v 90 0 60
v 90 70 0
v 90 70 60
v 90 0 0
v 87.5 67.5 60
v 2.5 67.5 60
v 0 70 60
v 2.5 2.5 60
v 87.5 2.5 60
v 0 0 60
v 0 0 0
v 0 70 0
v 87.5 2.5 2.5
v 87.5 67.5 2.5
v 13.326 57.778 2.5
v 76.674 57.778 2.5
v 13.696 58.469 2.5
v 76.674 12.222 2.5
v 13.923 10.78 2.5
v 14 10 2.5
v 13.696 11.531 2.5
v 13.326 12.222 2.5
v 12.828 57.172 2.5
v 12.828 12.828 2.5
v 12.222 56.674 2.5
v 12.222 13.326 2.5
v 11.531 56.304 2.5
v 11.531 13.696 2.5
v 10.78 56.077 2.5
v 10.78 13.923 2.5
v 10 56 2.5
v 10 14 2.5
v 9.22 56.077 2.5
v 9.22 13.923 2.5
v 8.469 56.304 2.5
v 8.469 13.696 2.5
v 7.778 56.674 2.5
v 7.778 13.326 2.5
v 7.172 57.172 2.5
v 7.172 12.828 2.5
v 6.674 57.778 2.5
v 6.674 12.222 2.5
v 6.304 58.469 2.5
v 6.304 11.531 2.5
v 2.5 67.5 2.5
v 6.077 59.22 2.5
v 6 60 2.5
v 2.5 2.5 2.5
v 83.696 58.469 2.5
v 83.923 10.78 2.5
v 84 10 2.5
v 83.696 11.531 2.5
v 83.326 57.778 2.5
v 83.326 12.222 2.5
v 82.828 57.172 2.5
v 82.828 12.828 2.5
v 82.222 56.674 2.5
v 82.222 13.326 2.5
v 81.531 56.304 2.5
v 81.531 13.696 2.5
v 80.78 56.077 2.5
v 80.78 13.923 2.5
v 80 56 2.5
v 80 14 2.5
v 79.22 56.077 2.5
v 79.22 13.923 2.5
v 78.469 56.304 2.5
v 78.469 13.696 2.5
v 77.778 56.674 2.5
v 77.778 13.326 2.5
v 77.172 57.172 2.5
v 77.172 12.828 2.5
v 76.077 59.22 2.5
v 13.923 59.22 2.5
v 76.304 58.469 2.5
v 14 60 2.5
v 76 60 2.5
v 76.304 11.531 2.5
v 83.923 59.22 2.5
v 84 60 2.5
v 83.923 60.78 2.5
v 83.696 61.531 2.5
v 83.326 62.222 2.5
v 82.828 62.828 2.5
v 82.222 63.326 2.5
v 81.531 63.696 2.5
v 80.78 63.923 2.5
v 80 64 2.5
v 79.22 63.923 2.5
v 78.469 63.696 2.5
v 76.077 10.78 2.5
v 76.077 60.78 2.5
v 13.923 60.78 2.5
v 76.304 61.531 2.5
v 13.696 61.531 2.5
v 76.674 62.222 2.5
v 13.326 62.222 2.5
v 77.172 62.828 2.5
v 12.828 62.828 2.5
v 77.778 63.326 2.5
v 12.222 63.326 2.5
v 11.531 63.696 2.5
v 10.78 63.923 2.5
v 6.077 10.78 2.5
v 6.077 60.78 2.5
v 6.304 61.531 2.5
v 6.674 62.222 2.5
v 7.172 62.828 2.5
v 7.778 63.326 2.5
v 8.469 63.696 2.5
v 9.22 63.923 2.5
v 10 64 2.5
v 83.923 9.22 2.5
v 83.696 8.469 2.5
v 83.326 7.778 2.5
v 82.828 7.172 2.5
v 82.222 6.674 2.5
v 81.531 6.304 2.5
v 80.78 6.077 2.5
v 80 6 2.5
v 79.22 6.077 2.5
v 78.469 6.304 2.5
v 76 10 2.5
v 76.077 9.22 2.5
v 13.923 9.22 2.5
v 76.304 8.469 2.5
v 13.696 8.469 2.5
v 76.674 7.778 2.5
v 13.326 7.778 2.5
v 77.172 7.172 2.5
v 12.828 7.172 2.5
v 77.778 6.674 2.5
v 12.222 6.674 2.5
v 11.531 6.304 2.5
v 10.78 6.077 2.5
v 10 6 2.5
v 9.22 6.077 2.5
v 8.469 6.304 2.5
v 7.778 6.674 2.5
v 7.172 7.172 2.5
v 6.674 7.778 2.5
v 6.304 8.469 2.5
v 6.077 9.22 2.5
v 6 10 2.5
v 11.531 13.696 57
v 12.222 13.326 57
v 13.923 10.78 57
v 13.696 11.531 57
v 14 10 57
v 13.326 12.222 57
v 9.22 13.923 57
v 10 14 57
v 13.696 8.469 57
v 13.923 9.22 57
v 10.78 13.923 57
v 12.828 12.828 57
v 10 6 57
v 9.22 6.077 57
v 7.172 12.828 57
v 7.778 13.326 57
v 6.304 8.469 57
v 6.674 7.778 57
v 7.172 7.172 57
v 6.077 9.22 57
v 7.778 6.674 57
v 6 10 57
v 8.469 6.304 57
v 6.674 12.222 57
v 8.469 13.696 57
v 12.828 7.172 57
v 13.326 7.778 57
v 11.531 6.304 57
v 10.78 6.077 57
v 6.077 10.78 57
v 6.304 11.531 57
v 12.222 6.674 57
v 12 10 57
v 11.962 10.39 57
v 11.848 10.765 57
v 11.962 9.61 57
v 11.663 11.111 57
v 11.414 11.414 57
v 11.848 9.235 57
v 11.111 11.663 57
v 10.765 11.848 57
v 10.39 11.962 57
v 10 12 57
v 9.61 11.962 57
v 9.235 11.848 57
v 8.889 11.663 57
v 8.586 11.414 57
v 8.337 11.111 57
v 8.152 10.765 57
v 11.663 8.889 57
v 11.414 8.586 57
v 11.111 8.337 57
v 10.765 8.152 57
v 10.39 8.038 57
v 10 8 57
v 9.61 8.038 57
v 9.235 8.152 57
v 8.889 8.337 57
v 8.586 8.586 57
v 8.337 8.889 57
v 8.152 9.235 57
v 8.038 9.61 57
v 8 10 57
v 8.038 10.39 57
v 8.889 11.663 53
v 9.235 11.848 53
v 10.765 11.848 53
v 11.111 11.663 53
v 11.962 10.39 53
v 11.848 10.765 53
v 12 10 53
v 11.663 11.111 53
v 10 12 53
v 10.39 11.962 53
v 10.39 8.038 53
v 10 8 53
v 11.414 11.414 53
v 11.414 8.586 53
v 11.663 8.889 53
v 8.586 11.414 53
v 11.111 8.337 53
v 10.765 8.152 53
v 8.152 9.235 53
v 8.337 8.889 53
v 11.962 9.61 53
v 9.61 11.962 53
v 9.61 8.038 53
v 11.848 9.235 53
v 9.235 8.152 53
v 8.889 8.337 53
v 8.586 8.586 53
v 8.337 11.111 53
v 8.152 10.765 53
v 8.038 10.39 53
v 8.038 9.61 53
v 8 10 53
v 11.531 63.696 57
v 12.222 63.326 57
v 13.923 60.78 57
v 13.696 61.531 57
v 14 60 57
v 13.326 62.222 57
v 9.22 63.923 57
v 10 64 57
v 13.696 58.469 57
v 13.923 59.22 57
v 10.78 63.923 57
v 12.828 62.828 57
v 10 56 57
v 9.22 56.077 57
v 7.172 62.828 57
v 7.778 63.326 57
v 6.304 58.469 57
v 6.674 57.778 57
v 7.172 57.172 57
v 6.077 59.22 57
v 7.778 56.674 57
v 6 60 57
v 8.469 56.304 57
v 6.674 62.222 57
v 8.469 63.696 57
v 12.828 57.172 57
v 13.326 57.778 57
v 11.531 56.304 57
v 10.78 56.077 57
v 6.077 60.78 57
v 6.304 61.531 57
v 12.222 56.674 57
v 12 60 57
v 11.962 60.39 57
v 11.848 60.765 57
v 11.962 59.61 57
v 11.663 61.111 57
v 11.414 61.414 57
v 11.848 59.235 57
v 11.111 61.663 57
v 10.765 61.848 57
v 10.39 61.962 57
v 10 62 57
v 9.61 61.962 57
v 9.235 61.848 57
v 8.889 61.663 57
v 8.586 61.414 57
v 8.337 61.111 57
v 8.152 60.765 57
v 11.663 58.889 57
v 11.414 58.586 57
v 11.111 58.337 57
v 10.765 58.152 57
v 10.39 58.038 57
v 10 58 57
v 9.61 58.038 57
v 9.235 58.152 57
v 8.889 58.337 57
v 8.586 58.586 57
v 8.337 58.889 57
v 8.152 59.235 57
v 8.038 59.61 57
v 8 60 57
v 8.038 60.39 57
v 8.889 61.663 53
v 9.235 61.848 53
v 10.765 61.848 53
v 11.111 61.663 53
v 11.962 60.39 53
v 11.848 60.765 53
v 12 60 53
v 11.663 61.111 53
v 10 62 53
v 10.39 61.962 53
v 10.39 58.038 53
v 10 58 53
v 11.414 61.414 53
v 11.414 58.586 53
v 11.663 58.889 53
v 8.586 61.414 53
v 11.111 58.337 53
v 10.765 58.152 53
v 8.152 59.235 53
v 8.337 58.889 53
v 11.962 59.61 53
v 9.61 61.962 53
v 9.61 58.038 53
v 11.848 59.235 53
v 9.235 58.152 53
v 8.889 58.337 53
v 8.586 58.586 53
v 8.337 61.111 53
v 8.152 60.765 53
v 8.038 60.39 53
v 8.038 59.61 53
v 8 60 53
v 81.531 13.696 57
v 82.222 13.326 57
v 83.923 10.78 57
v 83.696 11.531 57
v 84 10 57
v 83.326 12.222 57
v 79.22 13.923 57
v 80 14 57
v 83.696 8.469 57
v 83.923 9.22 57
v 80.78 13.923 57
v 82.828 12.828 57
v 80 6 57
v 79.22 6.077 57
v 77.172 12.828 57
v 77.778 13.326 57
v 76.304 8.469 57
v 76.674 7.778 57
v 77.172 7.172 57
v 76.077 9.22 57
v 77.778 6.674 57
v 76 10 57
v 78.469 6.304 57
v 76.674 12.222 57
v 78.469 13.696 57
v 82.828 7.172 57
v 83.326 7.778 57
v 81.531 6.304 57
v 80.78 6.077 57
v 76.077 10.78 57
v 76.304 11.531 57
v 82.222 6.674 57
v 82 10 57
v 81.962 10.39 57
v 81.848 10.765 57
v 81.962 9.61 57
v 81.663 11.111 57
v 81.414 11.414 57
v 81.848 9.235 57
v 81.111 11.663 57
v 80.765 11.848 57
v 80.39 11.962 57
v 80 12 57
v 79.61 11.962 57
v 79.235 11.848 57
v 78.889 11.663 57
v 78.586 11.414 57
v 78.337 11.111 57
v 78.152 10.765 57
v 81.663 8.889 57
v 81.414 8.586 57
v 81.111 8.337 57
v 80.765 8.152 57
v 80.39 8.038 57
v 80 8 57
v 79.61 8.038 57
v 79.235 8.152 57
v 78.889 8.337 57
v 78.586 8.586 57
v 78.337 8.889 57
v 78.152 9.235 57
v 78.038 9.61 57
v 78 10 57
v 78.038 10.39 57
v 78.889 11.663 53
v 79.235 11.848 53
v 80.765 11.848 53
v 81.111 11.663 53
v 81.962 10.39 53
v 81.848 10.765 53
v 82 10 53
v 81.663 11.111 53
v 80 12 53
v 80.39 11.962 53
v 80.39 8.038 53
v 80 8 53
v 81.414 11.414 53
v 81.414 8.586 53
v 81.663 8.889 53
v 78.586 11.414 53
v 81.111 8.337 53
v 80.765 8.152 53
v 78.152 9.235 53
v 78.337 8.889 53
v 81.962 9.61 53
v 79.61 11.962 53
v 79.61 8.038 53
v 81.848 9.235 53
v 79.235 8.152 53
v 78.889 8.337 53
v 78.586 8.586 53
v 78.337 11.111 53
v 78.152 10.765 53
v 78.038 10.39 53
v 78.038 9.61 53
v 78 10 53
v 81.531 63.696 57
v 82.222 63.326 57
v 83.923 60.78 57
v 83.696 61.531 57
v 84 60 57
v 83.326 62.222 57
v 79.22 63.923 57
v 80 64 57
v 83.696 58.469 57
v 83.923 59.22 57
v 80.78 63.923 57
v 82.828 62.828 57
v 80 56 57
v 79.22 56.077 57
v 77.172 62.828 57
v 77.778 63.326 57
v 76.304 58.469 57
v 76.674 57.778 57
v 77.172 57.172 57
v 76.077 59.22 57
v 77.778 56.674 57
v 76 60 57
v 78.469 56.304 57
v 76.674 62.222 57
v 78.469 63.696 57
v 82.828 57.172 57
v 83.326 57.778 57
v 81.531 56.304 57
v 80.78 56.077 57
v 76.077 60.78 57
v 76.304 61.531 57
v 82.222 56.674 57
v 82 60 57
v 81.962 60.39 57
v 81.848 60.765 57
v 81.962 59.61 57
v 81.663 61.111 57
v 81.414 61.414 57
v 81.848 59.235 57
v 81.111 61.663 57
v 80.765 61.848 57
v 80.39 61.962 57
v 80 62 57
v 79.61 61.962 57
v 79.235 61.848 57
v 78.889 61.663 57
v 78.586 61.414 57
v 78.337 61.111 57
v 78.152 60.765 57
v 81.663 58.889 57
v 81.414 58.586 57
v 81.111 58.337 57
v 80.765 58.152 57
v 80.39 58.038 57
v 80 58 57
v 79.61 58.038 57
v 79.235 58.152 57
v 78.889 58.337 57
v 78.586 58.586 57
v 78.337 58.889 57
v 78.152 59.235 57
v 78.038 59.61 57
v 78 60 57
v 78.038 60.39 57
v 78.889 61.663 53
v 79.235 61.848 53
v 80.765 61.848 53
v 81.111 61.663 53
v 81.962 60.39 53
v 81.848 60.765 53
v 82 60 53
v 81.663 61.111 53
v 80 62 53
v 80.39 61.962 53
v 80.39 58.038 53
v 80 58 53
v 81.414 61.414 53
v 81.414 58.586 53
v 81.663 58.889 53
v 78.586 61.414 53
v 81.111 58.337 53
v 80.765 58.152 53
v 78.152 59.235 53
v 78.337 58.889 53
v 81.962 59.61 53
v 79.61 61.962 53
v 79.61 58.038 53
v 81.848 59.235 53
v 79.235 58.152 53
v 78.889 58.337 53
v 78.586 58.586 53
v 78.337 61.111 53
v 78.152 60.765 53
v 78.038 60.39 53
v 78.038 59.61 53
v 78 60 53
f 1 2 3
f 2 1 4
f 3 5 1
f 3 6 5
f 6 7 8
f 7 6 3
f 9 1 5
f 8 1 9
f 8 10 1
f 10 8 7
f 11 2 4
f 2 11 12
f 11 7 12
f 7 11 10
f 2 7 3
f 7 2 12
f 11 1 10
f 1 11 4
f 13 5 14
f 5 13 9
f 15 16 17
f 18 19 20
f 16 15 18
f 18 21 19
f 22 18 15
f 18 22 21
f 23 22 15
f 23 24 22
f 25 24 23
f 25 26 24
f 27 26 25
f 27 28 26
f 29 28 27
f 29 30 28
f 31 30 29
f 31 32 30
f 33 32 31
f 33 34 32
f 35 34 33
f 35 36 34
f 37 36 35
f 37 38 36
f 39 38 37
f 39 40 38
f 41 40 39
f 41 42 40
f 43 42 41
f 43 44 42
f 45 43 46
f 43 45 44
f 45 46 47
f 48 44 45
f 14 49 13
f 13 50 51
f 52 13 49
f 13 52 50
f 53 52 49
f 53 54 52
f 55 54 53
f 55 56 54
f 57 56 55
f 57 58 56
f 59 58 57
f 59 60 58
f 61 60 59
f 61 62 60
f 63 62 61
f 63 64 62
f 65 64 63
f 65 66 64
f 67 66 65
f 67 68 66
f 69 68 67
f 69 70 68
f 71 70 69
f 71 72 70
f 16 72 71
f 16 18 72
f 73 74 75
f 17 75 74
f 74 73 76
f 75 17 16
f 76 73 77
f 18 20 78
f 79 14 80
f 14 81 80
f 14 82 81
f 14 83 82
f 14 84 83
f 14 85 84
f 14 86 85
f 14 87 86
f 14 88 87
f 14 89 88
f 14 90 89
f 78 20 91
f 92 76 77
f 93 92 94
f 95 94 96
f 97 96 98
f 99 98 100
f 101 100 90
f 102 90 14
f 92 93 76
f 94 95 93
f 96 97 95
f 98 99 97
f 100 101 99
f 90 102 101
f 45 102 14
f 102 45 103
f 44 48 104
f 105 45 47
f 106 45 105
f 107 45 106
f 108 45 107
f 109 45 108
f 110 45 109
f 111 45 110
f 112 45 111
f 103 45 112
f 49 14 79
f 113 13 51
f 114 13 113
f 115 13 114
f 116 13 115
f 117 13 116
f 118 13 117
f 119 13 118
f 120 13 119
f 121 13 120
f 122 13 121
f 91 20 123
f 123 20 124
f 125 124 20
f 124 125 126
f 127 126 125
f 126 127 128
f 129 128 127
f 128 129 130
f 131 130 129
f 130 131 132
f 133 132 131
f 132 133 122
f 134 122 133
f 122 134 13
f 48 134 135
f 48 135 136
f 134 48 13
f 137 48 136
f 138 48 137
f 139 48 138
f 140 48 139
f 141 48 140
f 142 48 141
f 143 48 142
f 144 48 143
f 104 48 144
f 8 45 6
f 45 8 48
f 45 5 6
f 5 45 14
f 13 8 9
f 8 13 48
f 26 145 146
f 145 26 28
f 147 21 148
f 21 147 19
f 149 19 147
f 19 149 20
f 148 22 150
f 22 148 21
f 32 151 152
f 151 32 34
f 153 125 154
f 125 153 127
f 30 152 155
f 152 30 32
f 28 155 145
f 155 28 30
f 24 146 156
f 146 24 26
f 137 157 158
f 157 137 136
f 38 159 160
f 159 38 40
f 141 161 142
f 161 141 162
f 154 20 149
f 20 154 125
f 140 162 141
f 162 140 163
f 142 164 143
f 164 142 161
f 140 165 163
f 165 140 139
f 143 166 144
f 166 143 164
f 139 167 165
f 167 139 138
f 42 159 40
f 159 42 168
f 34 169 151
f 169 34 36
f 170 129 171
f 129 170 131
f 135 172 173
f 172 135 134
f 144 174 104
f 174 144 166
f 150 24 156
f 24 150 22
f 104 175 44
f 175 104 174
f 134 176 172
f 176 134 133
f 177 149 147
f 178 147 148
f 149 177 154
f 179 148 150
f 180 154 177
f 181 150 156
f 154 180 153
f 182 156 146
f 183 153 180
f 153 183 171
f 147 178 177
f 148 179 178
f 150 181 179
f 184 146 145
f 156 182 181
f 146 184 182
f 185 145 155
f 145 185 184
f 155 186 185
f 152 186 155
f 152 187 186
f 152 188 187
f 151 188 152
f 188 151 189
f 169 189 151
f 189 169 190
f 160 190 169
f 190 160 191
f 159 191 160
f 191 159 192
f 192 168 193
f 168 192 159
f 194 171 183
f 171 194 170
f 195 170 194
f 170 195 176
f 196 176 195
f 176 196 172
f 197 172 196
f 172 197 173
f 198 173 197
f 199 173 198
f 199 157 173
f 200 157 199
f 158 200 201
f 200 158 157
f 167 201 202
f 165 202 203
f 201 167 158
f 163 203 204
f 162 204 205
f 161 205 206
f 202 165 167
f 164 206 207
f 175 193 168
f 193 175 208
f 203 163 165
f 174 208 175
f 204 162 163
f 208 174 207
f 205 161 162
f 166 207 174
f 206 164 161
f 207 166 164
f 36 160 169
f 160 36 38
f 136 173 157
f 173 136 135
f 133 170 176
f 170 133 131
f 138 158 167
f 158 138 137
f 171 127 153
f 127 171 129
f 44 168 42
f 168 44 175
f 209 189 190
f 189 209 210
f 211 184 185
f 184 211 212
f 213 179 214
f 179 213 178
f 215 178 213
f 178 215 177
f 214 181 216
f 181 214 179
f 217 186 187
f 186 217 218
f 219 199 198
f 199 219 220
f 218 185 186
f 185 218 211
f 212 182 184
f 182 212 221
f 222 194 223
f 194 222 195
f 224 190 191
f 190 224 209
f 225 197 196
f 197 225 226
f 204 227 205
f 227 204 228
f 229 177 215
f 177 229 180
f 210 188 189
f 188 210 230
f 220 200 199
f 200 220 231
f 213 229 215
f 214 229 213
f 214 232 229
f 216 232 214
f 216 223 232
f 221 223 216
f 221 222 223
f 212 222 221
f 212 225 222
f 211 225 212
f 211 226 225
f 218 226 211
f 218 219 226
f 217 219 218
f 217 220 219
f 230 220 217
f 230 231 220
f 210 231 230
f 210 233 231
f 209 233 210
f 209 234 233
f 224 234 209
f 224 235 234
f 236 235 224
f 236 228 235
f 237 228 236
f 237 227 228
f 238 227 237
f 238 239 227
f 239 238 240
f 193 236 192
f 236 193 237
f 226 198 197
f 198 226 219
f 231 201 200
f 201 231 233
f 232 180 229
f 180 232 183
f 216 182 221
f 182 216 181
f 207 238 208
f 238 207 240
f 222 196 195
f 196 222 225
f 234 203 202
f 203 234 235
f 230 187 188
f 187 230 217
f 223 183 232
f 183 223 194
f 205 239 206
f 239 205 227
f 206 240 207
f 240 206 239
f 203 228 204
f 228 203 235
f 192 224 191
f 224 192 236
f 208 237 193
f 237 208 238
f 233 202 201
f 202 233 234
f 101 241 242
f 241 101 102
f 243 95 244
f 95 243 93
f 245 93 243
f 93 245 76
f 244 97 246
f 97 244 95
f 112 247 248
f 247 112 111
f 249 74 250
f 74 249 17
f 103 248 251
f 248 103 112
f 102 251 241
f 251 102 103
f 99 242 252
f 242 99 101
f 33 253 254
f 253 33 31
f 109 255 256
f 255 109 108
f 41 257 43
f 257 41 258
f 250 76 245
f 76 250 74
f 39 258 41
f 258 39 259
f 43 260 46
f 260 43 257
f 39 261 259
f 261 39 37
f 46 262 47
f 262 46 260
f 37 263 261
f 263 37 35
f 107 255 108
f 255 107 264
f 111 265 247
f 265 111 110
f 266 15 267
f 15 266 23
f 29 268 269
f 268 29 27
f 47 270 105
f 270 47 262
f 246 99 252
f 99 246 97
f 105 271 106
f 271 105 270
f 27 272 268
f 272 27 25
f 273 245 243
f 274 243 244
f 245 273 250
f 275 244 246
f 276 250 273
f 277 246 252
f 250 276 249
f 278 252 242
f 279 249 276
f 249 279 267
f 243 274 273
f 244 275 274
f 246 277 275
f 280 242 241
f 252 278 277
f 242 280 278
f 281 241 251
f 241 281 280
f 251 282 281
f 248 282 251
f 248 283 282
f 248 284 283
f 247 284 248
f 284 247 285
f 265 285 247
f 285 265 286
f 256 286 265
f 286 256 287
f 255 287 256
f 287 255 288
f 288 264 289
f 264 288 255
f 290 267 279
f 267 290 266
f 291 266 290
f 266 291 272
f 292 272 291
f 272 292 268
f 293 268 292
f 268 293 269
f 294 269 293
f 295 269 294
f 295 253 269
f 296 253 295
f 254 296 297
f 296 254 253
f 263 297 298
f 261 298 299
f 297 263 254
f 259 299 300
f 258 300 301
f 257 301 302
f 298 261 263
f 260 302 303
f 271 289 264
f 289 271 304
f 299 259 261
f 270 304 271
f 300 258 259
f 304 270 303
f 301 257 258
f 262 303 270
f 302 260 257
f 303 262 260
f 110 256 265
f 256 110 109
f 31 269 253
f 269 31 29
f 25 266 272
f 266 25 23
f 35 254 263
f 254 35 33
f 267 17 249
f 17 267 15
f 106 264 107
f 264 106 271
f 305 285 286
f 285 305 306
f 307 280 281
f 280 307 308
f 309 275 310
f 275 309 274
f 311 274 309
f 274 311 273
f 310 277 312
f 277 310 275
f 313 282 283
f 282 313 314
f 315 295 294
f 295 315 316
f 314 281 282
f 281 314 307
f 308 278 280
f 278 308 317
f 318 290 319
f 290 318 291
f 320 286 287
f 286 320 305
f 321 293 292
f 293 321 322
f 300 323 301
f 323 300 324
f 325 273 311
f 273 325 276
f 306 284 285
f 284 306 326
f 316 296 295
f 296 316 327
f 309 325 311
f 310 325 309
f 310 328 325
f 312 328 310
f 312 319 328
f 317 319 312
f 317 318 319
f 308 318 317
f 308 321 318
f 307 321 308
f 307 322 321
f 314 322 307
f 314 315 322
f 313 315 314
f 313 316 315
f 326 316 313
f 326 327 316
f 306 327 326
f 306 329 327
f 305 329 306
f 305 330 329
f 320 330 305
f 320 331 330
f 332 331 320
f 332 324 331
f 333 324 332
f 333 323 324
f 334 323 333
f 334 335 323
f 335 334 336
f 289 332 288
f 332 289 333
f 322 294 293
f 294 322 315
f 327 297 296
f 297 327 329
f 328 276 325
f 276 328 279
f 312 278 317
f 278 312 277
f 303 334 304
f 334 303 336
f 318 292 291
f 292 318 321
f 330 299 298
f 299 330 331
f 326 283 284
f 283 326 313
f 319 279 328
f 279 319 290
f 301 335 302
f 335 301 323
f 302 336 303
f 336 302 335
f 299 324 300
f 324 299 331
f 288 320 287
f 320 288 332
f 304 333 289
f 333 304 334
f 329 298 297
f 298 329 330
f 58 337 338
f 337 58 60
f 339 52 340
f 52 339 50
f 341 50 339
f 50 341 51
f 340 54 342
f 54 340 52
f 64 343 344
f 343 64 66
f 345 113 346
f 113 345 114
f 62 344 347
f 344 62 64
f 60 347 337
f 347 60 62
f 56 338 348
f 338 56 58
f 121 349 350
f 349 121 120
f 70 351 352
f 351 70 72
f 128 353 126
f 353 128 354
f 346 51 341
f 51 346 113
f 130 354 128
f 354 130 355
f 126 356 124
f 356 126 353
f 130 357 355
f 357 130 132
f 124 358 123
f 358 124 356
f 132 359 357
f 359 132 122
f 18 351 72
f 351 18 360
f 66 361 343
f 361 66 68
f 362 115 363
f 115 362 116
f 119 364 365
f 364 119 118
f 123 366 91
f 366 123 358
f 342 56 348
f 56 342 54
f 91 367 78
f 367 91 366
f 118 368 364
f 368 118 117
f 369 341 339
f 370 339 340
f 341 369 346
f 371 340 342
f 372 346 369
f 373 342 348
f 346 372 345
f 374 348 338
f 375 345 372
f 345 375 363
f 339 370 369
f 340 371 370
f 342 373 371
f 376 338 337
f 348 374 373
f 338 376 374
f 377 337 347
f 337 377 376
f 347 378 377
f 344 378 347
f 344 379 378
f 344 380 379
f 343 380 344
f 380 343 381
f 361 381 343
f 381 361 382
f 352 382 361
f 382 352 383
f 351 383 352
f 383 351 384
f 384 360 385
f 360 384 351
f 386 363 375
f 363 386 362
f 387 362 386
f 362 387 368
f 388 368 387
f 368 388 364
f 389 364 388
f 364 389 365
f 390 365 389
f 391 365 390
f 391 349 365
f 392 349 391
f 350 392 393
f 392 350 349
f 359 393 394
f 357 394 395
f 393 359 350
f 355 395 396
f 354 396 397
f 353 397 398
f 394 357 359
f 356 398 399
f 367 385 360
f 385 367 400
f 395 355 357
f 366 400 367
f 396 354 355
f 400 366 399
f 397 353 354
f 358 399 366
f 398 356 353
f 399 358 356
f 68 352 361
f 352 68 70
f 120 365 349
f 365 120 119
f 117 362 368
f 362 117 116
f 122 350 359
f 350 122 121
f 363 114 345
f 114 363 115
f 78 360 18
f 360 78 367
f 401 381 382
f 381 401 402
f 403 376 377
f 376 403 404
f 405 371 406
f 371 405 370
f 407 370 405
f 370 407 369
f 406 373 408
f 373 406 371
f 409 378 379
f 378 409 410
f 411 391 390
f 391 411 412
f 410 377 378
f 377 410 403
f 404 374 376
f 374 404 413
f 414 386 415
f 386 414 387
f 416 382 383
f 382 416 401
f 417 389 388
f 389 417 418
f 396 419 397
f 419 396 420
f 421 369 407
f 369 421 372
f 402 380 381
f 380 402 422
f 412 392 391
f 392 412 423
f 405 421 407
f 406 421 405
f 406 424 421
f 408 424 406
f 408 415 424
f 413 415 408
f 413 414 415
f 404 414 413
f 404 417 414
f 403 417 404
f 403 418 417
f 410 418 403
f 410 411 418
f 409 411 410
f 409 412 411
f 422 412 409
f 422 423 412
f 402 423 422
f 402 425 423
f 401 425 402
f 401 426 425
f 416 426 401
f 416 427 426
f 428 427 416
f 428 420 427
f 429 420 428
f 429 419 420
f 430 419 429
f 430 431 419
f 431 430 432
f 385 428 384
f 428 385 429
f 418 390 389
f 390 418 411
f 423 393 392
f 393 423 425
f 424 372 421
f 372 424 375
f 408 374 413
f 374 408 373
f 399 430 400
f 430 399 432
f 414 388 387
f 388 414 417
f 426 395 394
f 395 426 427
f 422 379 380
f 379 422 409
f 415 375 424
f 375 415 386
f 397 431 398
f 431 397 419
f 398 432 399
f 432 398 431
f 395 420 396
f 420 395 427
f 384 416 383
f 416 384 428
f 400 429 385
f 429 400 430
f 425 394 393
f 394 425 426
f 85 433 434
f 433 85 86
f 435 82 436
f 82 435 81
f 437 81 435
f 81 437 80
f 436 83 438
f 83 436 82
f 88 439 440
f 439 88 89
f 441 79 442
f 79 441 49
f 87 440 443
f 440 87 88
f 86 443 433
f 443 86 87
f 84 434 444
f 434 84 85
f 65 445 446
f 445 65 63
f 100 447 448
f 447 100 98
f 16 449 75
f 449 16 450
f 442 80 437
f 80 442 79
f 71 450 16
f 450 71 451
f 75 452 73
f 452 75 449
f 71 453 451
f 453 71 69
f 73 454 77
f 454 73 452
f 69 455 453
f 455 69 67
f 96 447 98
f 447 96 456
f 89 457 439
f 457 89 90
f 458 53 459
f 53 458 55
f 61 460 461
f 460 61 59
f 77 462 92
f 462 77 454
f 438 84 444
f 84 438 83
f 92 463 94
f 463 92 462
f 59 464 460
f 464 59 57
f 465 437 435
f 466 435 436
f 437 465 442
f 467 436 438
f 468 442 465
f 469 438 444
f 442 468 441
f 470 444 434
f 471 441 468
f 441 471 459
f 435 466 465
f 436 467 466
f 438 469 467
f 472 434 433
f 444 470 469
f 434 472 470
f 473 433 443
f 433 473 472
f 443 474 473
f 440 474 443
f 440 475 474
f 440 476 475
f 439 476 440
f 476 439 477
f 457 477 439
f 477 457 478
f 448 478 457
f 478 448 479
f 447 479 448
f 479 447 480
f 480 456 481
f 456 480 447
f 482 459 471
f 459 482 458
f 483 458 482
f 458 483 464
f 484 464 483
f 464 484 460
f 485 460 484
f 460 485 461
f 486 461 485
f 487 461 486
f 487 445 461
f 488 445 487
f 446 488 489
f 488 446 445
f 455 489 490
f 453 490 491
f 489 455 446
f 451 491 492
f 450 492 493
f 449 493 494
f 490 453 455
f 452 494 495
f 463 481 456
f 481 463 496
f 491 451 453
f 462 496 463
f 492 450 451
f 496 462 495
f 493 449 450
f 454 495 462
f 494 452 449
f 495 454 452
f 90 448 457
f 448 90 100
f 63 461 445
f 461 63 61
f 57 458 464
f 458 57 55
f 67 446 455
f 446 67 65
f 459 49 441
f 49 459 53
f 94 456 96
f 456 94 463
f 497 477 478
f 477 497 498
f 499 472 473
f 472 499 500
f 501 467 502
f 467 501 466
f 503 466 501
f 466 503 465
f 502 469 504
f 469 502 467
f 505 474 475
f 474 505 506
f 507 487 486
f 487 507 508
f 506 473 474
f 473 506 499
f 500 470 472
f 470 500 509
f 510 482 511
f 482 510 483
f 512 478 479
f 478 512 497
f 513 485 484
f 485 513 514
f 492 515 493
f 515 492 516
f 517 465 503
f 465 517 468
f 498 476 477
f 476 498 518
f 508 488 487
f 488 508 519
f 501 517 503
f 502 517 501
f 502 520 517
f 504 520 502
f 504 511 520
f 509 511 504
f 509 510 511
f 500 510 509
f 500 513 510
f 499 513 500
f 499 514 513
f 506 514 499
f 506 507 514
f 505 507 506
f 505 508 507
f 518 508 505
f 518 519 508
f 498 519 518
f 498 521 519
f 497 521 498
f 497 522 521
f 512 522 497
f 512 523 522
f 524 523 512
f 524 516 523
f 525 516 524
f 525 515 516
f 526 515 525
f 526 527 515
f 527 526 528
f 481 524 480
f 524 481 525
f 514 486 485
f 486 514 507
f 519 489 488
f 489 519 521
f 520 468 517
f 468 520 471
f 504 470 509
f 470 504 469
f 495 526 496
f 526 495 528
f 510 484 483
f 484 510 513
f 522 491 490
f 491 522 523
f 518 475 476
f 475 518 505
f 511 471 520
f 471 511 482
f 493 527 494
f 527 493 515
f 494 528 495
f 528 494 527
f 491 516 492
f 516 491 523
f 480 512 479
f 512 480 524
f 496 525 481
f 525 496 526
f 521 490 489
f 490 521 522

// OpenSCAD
$fn = 32;

// ----------------------------------------------------------------------
// Enclosure box: bosses enclosure
// ----------------------------------------------------------------------

// --- parameters (mm) ---
box_l = 90;               // outer length, X
box_w = 70;               // outer width, Y
box_h = 60;               // outer height
wall_t = 2.5;             // wall thickness
boss_r = 4;               // corner boss radius
hole_r = 2;               // boss screw hole radius
boss_in = 10;             // boss inset from the corners
fit_tol = 0.05;           // tolerance for press fits, mm
free_tol = 0.2;           // tolerance for clearance fits, mm

inner_h = box_h - wall_t;  // cavity depth
boss_h = inner_h - 2;  // corner boss height

difference() {
  union() {
    difference() {
      cube([box_l, box_w, box_h]);
      translate([wall_t, wall_t, wall_t])
        cube([box_l - 2 * wall_t, box_w - 2 * wall_t, box_h]);
    }
    for (sx = [0, 1], sy = [0, 1])
      translate([sx ? box_l - boss_in : boss_in,
                 sy ? box_w - boss_in : boss_in, wall_t - 1])
        difference() {
          cylinder(r = boss_r, h = boss_h);
          translate([0, 0, boss_h - 4])
            cylinder(r = hole_r, h = 5);
        }
  }
}
